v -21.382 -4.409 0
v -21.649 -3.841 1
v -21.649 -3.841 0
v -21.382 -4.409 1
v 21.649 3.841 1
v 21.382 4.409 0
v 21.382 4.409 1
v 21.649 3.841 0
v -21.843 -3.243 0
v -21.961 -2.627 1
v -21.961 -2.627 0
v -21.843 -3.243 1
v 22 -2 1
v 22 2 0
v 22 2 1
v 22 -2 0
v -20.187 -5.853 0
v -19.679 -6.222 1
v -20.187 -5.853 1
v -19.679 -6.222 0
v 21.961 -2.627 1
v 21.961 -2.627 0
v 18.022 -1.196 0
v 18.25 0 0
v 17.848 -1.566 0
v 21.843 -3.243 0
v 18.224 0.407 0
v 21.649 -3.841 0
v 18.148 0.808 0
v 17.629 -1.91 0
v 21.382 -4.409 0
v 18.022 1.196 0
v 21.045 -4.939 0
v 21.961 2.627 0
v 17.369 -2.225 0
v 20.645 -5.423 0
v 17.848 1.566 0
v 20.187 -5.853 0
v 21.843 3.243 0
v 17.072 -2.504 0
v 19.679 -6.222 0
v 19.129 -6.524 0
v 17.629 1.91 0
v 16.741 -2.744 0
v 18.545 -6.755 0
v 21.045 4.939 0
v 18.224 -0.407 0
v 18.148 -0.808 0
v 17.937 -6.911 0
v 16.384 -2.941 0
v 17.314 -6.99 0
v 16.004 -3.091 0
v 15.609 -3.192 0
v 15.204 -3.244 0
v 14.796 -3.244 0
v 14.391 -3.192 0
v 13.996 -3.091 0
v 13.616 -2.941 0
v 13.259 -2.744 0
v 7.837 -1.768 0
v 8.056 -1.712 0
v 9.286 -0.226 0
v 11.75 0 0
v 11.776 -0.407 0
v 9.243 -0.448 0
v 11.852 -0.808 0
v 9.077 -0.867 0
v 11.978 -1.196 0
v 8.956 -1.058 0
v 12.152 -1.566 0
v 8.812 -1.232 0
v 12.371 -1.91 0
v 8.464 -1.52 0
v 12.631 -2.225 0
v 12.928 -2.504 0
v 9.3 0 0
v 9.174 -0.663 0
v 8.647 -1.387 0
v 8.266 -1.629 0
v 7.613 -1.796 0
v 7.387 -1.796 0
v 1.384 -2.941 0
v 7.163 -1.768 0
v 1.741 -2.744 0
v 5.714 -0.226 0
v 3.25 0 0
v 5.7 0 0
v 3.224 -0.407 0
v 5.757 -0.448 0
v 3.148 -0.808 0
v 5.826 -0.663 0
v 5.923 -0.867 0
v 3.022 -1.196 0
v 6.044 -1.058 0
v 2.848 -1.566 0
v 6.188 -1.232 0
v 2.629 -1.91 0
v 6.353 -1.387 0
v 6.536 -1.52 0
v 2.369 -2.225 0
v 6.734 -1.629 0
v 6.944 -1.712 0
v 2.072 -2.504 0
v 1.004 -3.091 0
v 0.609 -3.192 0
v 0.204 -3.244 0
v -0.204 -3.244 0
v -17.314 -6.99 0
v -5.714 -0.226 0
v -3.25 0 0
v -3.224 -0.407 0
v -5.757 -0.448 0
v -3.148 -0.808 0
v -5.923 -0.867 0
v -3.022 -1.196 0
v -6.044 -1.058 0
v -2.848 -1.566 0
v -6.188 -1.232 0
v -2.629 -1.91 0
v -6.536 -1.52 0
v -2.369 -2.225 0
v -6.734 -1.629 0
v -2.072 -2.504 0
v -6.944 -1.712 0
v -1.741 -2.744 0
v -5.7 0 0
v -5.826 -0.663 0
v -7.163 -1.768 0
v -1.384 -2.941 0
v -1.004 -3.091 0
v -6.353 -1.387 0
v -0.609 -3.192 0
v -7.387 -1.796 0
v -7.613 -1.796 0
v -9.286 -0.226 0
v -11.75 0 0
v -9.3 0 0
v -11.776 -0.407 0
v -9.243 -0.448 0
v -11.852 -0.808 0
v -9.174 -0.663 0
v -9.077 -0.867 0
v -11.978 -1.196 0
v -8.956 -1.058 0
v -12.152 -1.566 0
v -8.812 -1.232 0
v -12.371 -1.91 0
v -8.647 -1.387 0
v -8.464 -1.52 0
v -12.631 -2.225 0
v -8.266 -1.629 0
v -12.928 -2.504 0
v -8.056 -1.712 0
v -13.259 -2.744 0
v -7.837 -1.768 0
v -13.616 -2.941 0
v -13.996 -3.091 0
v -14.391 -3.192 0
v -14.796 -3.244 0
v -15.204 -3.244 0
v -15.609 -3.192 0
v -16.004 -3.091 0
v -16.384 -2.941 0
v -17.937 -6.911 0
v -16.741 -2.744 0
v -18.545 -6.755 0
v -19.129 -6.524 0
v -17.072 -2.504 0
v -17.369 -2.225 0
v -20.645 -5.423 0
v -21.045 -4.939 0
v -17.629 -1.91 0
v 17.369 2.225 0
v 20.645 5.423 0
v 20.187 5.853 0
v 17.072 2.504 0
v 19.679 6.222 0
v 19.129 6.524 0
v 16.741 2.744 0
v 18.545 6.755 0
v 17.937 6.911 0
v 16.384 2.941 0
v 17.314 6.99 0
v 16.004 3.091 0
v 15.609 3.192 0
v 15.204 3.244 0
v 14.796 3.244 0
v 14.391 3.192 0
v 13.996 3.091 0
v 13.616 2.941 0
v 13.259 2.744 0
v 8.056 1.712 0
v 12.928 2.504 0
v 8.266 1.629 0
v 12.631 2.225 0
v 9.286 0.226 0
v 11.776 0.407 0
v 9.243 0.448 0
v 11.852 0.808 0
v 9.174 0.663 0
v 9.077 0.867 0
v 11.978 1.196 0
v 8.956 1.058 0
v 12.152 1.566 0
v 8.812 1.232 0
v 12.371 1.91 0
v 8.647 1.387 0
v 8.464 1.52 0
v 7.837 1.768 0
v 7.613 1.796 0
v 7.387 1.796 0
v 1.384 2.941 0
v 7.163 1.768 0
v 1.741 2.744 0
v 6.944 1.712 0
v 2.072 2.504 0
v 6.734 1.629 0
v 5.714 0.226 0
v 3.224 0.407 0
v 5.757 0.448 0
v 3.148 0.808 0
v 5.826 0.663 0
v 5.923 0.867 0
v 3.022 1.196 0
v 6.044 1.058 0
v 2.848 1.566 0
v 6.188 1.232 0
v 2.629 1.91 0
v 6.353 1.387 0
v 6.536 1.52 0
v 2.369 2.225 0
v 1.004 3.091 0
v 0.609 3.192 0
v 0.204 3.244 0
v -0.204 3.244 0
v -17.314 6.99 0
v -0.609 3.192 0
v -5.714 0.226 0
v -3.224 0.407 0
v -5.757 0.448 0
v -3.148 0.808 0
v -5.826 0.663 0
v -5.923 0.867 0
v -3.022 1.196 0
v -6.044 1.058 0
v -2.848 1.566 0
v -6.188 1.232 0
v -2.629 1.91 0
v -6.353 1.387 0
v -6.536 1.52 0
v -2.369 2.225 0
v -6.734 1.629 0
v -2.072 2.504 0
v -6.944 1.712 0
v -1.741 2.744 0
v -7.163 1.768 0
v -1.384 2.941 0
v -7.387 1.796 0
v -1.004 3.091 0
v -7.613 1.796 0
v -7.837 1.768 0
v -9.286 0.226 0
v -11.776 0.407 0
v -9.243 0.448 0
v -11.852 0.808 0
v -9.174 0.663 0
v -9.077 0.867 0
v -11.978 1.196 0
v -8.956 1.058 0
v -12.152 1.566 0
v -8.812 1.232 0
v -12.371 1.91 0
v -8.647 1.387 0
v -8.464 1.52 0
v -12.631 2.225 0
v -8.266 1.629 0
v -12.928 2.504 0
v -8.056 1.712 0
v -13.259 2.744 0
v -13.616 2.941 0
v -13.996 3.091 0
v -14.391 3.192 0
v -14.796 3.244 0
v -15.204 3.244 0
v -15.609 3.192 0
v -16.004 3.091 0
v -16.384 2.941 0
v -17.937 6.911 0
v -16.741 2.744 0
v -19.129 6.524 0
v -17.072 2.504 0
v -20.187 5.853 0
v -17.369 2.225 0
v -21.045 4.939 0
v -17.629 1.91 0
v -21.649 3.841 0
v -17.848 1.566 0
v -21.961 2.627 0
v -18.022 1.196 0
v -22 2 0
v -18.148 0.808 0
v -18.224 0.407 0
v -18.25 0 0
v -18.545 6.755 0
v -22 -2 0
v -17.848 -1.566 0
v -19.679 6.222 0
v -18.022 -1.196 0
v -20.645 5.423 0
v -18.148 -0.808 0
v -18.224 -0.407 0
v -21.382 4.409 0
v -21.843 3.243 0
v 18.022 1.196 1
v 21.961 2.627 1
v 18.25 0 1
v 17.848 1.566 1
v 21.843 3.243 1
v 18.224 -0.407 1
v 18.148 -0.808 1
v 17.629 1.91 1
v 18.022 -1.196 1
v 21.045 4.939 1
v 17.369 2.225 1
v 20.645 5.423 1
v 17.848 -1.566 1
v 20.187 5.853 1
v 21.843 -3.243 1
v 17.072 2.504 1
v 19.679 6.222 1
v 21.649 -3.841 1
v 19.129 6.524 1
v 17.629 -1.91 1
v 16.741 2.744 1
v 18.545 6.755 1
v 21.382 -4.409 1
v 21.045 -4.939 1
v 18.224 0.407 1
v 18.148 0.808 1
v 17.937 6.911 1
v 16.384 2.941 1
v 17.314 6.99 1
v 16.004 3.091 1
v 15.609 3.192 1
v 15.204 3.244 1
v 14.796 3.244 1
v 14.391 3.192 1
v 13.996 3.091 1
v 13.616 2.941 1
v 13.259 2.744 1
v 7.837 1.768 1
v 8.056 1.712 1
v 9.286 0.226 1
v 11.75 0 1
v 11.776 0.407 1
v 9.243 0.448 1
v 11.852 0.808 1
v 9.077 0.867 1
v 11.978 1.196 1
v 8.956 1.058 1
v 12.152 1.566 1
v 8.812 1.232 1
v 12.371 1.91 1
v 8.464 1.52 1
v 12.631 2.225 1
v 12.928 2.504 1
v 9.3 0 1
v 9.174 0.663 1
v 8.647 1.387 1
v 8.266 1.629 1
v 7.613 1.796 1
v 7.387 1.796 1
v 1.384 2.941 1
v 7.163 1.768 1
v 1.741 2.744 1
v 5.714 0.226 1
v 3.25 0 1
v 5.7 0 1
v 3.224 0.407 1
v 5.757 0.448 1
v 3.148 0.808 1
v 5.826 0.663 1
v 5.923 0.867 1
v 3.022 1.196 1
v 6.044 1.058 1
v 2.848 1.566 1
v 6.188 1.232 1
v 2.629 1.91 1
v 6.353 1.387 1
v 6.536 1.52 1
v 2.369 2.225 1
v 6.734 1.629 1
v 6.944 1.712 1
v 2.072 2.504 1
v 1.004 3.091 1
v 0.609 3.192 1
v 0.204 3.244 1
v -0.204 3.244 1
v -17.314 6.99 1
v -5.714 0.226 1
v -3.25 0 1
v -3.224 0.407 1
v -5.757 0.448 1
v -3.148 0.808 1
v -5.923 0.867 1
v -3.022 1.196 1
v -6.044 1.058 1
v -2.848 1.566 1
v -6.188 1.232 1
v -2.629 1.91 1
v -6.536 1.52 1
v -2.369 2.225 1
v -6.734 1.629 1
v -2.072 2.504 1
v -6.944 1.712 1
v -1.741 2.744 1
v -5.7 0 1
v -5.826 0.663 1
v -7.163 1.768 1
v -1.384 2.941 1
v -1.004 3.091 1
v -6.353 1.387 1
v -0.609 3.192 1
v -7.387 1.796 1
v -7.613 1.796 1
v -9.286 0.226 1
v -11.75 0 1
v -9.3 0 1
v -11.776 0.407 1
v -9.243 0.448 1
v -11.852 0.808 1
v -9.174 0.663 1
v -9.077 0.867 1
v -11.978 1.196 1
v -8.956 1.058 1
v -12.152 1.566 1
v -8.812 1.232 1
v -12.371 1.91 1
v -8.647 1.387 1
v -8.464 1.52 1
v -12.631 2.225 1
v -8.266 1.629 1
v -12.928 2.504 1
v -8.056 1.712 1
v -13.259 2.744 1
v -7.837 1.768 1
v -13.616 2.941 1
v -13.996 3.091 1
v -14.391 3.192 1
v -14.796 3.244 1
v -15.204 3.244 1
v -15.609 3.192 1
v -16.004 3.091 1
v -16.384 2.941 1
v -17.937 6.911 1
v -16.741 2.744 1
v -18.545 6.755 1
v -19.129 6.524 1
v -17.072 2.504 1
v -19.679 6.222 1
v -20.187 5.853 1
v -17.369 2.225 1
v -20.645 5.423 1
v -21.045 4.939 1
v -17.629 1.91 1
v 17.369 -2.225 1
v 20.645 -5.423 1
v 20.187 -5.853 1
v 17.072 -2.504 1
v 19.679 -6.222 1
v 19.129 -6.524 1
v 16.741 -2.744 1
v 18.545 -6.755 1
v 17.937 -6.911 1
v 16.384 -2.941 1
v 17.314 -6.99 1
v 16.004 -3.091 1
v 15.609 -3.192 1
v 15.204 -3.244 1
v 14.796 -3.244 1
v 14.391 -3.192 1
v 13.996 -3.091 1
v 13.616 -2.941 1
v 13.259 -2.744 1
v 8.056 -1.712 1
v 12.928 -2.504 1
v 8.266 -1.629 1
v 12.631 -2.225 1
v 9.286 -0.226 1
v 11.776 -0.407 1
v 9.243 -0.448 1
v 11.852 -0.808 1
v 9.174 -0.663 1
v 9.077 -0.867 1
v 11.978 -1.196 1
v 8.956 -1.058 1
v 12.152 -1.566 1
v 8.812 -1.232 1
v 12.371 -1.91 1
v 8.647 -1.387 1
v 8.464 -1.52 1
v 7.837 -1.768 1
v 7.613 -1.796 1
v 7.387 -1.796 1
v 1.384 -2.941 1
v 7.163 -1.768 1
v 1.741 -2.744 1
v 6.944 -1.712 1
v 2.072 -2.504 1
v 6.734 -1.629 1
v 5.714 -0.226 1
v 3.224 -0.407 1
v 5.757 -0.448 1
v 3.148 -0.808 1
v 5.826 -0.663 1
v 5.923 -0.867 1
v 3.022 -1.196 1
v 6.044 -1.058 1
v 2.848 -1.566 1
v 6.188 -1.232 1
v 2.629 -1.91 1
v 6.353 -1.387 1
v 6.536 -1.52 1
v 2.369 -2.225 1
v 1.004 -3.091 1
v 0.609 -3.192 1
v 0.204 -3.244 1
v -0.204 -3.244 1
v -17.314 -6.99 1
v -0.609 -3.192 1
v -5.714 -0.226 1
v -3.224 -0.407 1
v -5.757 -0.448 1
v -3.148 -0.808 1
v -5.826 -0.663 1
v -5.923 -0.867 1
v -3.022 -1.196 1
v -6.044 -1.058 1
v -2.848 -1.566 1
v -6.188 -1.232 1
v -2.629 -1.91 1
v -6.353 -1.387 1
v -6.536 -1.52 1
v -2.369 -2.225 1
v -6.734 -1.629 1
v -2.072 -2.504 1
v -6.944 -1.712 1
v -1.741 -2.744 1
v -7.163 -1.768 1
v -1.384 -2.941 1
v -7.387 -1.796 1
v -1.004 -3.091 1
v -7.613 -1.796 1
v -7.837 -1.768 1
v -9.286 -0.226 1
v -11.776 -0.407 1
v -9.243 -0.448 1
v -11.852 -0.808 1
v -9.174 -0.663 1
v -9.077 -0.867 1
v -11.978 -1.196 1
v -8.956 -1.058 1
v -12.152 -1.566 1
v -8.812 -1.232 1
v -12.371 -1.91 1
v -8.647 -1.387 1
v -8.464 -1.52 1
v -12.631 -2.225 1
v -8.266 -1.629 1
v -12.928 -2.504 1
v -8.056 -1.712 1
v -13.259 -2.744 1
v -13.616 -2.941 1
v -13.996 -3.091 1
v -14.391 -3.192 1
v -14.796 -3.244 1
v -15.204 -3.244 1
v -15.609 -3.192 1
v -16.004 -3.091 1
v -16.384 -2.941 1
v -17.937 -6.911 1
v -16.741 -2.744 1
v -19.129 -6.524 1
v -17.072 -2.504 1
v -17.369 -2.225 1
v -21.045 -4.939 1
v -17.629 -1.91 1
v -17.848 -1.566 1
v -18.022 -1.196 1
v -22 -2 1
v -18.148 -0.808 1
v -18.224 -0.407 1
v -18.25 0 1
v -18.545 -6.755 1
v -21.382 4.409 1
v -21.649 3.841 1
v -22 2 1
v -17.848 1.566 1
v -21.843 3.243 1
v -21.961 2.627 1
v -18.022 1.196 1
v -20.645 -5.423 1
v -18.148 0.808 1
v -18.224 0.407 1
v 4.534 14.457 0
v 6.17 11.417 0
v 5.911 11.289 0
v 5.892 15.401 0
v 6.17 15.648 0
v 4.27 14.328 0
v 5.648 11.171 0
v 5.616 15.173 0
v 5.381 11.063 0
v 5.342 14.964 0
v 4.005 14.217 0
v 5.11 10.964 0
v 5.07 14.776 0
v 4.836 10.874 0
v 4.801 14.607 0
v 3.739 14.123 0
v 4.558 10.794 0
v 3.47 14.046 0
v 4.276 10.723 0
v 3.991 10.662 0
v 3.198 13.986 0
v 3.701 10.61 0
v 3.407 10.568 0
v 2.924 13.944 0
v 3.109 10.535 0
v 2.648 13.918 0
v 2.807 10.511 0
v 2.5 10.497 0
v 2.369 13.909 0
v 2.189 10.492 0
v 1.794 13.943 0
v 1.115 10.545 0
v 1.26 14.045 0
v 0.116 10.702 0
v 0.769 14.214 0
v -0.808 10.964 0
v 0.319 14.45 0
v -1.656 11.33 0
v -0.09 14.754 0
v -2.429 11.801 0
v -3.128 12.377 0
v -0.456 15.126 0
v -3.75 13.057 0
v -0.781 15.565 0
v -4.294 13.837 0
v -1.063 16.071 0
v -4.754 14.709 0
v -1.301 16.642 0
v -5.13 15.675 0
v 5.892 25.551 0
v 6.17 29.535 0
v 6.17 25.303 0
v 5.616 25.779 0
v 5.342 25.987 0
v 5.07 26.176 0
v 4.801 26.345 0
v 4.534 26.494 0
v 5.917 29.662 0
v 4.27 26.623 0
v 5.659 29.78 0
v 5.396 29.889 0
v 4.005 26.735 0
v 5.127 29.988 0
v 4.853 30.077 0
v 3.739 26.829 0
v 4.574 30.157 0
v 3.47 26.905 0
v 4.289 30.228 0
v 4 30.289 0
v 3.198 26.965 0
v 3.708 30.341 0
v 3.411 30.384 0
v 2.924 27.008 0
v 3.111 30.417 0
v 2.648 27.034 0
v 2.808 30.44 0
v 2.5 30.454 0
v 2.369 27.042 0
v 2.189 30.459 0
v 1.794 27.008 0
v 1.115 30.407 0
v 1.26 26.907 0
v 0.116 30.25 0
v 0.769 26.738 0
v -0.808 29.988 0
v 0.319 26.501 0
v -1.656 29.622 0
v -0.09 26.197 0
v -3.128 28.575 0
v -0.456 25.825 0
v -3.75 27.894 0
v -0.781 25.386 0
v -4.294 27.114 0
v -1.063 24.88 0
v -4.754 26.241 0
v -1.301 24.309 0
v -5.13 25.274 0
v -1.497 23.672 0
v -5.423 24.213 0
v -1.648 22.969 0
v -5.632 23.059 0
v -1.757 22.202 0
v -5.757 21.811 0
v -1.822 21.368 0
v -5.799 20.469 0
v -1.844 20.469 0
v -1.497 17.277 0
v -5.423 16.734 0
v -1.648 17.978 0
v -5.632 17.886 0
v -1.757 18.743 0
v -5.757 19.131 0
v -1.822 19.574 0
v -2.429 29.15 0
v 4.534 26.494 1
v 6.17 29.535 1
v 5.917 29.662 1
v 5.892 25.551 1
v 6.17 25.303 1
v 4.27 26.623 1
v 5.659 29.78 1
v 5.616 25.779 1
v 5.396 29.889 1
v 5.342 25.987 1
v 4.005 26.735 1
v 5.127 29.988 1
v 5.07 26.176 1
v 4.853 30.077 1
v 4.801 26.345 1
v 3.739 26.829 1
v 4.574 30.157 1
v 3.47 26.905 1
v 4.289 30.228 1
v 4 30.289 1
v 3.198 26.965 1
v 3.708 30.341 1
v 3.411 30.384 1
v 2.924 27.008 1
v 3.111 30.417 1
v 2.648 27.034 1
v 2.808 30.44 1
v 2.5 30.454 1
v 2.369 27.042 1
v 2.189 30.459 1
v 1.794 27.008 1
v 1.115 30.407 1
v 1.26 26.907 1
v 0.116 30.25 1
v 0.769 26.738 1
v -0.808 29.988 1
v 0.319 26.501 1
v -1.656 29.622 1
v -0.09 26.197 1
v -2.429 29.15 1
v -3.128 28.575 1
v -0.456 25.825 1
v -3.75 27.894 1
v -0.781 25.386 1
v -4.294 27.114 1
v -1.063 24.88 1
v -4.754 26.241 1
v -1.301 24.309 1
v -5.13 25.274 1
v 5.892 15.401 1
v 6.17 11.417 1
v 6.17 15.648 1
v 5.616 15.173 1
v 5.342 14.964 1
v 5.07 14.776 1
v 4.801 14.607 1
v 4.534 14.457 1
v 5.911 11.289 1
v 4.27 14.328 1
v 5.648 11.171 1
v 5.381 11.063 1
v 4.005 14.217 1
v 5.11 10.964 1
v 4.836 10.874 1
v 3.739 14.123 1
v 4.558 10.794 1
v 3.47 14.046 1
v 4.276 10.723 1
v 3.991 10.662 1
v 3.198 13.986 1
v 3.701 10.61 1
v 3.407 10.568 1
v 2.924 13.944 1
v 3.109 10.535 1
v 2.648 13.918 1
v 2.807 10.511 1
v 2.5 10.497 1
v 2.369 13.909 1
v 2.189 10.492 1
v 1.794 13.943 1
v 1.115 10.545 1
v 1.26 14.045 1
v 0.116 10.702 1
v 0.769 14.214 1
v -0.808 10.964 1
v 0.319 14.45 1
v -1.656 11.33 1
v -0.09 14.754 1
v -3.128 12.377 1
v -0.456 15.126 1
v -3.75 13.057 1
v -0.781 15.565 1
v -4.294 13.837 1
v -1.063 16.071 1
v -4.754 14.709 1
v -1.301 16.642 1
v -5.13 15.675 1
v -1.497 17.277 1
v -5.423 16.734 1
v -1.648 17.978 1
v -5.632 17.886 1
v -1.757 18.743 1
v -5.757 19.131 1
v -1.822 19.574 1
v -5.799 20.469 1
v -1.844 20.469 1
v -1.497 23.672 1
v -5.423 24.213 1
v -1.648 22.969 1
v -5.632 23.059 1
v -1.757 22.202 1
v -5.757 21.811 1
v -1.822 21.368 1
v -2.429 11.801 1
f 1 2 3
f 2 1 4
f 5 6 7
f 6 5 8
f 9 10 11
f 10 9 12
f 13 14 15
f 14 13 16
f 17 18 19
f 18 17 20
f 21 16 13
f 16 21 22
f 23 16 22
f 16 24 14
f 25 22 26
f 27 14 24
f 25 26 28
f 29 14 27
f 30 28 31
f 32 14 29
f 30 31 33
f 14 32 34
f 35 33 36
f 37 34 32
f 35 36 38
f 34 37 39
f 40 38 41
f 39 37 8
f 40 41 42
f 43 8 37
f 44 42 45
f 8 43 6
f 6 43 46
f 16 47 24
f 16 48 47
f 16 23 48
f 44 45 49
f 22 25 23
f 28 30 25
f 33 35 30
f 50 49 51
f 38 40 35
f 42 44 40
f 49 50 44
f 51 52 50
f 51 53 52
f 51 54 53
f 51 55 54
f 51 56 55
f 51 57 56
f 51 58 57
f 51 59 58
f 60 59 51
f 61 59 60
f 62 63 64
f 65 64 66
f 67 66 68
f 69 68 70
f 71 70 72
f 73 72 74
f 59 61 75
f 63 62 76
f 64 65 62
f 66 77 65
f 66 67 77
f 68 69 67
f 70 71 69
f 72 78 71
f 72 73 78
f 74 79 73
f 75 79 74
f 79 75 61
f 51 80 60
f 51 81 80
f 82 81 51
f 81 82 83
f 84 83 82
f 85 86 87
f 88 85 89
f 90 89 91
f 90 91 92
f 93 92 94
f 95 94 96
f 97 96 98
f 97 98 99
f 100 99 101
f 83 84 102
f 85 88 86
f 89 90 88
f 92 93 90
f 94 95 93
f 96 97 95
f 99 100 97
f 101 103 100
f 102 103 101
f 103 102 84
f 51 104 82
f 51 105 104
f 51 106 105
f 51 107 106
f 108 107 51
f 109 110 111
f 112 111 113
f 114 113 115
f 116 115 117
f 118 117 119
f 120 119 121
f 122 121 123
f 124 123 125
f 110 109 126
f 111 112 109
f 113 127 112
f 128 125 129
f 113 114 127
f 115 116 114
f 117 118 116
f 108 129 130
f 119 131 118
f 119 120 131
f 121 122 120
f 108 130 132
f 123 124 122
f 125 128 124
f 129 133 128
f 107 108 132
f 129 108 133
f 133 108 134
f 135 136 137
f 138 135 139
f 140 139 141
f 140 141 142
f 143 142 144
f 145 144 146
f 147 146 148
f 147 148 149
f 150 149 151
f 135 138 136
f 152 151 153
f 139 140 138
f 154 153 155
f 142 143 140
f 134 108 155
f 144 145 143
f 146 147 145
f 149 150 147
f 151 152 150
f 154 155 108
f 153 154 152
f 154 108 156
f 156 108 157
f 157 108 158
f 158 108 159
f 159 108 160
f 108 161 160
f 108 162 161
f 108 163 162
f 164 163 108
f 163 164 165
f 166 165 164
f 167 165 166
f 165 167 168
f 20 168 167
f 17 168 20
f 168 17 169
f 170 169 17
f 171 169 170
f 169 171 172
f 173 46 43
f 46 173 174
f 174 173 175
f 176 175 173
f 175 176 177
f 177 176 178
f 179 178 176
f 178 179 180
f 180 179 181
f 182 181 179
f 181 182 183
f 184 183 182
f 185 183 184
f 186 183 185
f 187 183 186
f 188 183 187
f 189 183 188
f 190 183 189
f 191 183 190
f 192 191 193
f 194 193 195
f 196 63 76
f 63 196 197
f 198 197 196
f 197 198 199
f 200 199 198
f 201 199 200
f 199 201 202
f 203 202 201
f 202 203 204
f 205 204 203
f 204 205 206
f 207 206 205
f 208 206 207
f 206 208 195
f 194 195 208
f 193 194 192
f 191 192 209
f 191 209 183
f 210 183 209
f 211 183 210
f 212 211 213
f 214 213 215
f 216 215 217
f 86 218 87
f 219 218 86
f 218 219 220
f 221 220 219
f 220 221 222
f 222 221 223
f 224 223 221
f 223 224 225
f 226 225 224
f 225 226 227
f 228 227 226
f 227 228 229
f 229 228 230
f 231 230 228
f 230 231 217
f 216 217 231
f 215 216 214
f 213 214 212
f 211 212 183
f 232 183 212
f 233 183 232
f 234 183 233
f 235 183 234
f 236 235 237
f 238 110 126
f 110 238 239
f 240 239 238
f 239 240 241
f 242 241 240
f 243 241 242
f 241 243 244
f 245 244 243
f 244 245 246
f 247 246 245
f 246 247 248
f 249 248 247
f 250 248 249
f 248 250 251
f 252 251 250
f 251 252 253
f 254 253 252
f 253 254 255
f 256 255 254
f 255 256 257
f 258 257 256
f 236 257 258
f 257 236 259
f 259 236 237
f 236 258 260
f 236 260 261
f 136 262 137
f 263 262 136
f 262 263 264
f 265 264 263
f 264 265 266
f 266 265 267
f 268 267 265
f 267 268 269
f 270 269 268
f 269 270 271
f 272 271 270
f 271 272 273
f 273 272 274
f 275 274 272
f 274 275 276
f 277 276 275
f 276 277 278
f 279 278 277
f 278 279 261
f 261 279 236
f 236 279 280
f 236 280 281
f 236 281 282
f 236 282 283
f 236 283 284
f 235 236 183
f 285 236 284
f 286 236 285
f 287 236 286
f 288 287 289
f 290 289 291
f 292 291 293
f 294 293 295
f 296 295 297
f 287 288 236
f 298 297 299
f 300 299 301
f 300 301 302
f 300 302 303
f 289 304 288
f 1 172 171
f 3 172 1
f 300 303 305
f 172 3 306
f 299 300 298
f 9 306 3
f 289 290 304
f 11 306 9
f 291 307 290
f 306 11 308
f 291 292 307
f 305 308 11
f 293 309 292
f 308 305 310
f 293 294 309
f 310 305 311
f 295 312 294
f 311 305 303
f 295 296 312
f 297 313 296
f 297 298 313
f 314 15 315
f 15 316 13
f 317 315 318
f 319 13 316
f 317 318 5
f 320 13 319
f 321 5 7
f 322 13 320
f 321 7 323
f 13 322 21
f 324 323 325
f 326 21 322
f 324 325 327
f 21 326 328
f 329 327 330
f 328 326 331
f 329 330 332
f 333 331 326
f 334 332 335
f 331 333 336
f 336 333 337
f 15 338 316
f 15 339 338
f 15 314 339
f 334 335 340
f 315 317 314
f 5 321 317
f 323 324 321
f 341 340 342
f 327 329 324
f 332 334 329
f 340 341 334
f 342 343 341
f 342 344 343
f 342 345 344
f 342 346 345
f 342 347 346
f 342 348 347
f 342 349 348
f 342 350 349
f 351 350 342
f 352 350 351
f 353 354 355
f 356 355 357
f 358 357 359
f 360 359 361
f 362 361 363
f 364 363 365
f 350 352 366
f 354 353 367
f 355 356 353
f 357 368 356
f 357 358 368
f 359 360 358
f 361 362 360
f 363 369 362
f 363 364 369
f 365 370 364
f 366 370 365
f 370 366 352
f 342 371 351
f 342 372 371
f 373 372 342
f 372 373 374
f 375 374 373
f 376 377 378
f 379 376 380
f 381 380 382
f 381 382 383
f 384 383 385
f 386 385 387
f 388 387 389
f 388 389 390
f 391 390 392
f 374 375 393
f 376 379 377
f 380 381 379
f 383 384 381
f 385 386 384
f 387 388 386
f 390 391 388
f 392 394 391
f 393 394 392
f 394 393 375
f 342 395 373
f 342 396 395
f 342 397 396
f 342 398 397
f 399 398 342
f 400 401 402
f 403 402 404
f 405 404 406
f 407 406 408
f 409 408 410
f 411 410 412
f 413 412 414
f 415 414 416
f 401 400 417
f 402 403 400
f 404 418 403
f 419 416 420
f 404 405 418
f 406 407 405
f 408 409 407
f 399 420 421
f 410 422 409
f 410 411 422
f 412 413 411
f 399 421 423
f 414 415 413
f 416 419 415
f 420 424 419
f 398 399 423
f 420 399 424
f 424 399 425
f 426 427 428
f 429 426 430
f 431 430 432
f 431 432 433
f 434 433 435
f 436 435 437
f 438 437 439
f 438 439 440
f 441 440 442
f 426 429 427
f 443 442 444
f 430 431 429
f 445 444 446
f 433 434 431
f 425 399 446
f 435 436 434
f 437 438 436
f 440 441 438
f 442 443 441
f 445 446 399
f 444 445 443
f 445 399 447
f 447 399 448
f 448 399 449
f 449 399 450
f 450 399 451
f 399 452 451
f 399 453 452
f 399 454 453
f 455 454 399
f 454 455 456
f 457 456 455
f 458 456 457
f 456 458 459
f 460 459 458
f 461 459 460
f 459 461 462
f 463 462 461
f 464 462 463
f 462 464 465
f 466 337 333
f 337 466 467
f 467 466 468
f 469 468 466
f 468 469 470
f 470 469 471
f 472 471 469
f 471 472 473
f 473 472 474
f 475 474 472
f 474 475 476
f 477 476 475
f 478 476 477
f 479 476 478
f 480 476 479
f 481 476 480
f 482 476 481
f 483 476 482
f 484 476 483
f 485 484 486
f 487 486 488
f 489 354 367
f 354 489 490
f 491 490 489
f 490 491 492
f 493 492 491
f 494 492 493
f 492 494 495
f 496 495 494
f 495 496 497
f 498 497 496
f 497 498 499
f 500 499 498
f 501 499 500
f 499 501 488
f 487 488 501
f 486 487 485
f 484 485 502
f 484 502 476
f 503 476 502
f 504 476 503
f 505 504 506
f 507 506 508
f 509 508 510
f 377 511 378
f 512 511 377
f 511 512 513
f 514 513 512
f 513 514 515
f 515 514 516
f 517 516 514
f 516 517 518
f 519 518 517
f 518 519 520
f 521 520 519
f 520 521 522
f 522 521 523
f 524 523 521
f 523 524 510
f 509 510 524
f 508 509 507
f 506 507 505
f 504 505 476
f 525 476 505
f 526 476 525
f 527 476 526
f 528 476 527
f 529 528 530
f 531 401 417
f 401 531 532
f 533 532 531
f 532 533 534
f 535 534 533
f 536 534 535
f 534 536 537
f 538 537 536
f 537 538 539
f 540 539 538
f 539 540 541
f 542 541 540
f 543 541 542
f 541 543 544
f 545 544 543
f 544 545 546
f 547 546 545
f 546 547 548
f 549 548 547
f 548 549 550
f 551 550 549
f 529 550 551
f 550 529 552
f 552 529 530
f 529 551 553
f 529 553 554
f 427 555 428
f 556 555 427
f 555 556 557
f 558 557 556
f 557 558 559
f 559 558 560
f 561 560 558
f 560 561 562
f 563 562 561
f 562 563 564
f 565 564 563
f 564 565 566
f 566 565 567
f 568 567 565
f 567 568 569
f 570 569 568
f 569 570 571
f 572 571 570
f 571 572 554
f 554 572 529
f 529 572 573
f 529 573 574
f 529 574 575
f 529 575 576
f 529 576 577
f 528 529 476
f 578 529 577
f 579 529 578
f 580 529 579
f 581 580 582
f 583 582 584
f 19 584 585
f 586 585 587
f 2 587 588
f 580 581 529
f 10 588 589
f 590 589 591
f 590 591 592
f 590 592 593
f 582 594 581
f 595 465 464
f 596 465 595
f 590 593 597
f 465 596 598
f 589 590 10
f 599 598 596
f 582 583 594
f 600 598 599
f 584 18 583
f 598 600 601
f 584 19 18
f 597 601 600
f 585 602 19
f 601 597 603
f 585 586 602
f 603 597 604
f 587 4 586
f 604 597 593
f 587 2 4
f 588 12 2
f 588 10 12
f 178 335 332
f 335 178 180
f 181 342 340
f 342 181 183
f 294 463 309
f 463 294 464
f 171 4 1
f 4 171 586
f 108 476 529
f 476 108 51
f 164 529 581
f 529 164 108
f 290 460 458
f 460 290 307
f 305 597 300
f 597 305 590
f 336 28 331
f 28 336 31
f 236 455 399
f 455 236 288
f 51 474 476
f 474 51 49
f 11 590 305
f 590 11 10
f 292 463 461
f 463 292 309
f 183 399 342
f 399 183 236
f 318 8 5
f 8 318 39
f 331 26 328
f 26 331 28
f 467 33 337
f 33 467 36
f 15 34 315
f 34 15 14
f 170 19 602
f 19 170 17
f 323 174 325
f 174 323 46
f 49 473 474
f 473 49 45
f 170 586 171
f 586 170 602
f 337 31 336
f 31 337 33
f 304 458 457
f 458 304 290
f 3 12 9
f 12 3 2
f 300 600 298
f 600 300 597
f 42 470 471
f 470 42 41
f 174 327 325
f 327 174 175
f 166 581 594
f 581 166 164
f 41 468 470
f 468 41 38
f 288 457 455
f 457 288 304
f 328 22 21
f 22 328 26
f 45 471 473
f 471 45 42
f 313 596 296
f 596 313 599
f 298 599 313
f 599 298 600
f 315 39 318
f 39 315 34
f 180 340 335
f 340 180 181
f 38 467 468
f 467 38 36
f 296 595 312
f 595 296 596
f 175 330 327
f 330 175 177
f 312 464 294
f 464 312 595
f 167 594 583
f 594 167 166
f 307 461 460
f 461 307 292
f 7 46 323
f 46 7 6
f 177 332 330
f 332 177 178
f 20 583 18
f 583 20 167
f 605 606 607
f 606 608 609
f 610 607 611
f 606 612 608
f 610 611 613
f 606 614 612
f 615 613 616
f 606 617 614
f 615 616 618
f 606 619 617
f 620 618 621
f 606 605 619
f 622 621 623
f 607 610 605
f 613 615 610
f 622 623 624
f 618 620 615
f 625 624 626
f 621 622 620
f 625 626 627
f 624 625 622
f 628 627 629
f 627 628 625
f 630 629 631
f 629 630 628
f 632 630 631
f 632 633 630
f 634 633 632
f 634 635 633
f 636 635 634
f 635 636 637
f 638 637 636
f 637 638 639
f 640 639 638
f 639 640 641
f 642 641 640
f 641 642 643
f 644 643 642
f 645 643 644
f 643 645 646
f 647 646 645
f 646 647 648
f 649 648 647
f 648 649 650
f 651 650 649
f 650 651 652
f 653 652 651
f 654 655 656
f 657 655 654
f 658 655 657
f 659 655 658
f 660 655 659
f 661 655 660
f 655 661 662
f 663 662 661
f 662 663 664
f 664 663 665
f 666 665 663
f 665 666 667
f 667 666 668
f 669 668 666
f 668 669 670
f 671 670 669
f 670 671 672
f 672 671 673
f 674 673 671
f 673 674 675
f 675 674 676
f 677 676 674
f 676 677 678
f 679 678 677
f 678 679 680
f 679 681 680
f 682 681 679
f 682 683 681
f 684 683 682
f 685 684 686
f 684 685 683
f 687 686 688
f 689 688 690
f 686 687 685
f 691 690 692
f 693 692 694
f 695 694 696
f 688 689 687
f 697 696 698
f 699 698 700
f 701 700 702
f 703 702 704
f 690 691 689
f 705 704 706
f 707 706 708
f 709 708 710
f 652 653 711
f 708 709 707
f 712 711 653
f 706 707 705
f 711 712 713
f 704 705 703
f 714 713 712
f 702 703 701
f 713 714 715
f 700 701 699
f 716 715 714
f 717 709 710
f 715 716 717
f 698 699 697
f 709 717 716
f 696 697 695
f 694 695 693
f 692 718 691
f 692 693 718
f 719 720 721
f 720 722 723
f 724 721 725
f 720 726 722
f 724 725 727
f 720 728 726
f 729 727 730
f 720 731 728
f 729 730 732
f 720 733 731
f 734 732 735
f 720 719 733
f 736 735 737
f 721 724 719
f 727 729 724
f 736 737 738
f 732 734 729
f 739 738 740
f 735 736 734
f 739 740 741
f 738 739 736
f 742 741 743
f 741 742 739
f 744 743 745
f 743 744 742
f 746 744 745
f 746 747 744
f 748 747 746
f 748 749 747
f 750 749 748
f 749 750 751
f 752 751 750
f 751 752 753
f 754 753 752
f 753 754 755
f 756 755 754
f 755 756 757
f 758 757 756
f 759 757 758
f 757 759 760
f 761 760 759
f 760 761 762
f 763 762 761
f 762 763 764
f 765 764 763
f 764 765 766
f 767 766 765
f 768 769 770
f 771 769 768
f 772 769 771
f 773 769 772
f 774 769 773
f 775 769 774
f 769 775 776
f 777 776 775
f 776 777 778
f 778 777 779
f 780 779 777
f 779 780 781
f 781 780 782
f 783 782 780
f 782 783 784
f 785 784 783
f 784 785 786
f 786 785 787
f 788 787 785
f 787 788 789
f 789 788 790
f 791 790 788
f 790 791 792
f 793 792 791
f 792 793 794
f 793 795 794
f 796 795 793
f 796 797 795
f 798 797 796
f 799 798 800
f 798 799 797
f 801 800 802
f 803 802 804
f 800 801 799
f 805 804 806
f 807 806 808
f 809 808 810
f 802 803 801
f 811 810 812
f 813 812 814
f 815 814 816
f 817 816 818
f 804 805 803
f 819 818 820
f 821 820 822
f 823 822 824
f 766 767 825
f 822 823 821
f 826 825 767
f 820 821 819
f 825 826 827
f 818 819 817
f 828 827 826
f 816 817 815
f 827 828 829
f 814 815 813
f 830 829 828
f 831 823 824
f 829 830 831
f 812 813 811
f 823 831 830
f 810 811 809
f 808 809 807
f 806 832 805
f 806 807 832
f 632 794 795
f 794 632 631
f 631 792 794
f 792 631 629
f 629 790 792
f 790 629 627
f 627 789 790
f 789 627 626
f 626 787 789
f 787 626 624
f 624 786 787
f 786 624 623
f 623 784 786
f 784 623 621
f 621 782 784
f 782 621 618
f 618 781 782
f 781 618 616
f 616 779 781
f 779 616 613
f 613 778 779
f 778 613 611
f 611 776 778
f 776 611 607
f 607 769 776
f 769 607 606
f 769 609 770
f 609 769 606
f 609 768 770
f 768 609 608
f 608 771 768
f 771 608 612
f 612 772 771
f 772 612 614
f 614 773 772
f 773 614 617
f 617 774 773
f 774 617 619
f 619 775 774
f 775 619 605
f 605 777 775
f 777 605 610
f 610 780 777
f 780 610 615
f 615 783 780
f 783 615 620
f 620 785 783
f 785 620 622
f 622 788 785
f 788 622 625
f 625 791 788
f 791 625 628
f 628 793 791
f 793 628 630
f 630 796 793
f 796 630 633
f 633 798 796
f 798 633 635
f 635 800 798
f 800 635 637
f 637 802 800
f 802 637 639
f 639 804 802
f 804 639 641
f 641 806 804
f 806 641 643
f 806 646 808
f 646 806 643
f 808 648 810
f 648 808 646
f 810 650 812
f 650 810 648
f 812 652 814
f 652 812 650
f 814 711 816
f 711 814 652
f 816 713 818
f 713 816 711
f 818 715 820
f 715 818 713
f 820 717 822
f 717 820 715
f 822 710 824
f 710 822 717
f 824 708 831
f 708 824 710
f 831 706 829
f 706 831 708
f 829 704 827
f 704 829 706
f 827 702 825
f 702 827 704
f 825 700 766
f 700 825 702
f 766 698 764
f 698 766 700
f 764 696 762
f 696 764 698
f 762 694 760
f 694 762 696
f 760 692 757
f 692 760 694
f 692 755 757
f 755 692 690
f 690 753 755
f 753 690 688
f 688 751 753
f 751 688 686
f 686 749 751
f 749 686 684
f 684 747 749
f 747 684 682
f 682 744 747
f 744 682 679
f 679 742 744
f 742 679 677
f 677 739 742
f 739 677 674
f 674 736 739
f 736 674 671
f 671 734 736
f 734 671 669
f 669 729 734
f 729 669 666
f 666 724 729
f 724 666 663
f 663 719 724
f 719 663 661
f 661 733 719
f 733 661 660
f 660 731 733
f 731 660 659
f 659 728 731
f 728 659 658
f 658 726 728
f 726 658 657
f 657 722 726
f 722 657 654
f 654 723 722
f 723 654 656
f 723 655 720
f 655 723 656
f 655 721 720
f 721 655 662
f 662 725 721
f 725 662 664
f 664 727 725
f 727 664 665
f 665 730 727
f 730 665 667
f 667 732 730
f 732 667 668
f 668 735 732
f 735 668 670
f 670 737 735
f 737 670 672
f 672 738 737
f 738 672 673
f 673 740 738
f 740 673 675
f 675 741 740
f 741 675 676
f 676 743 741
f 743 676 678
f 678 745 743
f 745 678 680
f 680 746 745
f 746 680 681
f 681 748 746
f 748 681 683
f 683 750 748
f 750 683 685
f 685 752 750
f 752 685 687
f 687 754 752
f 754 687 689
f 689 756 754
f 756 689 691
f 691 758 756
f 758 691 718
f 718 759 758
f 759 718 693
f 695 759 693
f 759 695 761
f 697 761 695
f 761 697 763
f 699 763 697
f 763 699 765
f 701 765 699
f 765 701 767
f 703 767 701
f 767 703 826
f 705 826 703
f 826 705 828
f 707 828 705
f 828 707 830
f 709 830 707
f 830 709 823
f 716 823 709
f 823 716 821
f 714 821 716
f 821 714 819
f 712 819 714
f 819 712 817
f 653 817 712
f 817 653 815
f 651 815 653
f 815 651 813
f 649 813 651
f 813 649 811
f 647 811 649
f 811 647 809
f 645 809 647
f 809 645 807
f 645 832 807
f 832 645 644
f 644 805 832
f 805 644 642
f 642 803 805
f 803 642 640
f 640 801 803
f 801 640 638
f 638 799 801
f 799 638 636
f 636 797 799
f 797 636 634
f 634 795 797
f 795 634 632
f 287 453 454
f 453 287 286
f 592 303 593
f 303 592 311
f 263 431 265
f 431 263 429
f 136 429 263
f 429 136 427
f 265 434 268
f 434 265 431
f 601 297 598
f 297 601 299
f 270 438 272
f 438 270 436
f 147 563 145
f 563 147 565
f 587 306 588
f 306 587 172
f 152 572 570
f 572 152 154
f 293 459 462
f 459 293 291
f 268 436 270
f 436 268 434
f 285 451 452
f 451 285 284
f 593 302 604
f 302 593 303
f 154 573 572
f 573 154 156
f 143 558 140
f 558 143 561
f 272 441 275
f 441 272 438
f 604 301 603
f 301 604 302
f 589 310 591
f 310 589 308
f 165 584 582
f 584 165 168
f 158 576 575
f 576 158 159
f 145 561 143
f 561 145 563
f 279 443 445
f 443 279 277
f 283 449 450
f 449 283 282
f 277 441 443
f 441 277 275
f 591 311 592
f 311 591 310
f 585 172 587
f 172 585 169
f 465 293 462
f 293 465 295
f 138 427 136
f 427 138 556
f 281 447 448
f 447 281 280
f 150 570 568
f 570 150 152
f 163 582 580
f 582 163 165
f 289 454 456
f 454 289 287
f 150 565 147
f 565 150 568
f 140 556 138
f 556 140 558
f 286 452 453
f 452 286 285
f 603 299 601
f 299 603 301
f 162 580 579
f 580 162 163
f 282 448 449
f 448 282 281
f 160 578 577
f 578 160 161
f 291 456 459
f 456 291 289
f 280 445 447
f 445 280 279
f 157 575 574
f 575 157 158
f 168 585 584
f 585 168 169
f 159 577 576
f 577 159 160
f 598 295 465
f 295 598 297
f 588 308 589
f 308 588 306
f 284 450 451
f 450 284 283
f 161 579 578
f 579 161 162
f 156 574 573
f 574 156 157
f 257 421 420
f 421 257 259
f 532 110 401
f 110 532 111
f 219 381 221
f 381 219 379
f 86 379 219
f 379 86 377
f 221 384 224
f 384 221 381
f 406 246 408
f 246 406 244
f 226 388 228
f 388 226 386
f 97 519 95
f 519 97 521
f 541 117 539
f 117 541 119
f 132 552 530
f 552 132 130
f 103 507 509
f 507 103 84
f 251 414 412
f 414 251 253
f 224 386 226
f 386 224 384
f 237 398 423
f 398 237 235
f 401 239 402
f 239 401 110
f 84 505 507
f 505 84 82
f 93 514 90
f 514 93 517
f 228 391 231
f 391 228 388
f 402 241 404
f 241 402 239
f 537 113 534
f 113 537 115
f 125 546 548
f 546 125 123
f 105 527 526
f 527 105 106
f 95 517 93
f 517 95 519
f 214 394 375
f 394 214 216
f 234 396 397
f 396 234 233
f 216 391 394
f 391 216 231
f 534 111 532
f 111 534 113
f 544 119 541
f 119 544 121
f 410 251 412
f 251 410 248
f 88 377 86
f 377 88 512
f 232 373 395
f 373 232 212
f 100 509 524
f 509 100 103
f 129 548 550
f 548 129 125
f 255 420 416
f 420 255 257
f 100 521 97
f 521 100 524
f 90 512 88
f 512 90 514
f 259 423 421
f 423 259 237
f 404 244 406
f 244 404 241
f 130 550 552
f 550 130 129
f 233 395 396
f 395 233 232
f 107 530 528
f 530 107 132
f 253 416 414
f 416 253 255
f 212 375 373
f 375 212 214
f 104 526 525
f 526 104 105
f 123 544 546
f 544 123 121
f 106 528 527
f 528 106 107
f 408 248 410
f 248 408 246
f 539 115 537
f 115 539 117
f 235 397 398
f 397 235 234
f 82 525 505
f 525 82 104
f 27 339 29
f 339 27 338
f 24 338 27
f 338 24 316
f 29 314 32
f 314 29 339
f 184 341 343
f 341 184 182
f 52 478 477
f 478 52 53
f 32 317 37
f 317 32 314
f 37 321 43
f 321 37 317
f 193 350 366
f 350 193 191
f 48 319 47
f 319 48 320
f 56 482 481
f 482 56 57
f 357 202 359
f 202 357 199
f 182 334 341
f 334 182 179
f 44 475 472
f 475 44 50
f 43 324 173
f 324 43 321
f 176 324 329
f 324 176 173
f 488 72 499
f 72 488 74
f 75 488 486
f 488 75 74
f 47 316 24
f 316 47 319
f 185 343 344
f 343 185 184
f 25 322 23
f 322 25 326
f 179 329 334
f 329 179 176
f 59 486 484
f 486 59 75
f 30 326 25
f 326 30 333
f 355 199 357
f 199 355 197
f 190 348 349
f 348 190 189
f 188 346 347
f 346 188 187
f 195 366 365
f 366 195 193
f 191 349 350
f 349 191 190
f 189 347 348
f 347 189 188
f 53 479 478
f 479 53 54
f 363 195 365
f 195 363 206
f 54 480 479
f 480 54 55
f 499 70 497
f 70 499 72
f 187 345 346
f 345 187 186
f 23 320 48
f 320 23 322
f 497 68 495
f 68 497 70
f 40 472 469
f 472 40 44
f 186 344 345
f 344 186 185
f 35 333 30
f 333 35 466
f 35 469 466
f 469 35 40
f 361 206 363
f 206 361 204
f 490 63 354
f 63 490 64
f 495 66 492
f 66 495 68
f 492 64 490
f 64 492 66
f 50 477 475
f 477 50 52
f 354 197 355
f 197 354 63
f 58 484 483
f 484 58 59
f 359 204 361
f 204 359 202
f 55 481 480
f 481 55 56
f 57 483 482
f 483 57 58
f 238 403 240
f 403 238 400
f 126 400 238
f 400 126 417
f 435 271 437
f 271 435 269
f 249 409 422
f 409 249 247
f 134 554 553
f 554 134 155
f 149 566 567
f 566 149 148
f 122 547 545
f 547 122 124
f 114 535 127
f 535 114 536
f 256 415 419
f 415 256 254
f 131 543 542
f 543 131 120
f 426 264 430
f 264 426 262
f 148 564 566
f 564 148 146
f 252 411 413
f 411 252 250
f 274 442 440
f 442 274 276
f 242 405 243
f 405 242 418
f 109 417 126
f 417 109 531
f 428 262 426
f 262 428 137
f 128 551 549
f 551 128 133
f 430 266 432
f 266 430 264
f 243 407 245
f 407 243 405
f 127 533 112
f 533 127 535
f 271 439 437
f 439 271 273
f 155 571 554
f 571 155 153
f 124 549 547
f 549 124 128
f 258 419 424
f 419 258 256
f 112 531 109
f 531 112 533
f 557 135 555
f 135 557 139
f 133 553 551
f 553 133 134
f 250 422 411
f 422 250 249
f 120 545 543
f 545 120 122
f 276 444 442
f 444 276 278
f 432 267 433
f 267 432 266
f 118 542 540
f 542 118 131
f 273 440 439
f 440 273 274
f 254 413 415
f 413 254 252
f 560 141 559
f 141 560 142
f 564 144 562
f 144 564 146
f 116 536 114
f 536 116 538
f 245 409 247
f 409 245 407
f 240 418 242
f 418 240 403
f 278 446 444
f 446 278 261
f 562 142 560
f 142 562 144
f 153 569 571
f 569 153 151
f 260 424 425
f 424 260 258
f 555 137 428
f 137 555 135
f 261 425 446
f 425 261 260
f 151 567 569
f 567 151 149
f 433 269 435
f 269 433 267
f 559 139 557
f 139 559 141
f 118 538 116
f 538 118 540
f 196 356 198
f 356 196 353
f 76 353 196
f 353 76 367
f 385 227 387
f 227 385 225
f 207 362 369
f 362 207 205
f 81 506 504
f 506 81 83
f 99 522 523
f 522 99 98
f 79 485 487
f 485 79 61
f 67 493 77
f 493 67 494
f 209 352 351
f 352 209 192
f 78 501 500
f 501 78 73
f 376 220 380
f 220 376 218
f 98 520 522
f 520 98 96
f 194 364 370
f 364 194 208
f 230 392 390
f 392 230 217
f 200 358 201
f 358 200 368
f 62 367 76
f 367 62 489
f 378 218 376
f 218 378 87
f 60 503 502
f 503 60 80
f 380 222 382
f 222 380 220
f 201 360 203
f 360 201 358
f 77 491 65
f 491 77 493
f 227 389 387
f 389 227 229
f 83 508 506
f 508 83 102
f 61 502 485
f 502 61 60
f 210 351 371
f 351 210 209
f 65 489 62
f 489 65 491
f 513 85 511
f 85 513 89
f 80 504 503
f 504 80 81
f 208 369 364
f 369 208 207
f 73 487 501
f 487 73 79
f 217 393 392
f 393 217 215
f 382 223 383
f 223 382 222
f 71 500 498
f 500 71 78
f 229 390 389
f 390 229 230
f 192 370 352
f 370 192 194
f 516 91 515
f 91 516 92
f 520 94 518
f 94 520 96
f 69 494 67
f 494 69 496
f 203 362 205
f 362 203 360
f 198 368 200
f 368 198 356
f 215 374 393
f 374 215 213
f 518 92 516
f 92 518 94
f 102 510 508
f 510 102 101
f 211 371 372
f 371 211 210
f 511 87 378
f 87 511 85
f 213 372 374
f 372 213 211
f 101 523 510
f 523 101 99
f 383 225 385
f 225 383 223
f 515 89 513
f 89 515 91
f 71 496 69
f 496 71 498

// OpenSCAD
$fn = 50;


difference() {
	union() {
		hull() {
			translate(v = [-17.0000000000, 2.0000000000, 0]) {
				cylinder(h = 1, r = 5);
			}
			translate(v = [17.0000000000, 2.0000000000, 0]) {
				cylinder(h = 1, r = 5);
			}
			translate(v = [-17.0000000000, -2.0000000000, 0]) {
				cylinder(h = 1, r = 5);
			}
			translate(v = [17.0000000000, -2.0000000000, 0]) {
				cylinder(h = 1, r = 5);
			}
		}
		translate(v = [0, 30.0000000000, 0]) {
			linear_extrude(height = 1) {
				text(font = "DejaVu Sans Mono:style=Bold", halign = "center", size = 19.0000000000, text = "C", valign = "top");
			}
		}
	}
	union() {
		translate(v = [-15.0000000000, 0.0000000000, 0]) {
			translate(v = [0, 0, -100]) {
				cylinder(h = 200, r = 3.2500000000);
			}
		}
		translate(v = [0, 0, -100]) {
			cylinder(h = 200, r = 3.2500000000);
		}
		translate(v = [15.0000000000, 0.0000000000, 0]) {
			translate(v = [0, 0, -100]) {
				cylinder(h = 200, r = 3.2500000000);
			}
		}
		translate(v = [-15.0000000000, 0.0000000000, 0]) {
			translate(v = [0, 0, -100]) {
				cylinder(h = 200, r = 1.8000000000);
			}
		}
		translate(v = [-7.5000000000, 0.0000000000, 0]) {
			translate(v = [0, 0, -100]) {
				cylinder(h = 200, r = 1.8000000000);
			}
		}
		translate(v = [0, 0, -100]) {
			cylinder(h = 200, r = 1.8000000000);
		}
		translate(v = [7.5000000000, 0.0000000000, 0]) {
			translate(v = [0, 0, -100]) {
				cylinder(h = 200, r = 1.8000000000);
			}
		}
		translate(v = [15.0000000000, 0.0000000000, 0]) {
			translate(v = [0, 0, -100]) {
				cylinder(h = 200, r = 1.8000000000);
			}
		}
	}
}
